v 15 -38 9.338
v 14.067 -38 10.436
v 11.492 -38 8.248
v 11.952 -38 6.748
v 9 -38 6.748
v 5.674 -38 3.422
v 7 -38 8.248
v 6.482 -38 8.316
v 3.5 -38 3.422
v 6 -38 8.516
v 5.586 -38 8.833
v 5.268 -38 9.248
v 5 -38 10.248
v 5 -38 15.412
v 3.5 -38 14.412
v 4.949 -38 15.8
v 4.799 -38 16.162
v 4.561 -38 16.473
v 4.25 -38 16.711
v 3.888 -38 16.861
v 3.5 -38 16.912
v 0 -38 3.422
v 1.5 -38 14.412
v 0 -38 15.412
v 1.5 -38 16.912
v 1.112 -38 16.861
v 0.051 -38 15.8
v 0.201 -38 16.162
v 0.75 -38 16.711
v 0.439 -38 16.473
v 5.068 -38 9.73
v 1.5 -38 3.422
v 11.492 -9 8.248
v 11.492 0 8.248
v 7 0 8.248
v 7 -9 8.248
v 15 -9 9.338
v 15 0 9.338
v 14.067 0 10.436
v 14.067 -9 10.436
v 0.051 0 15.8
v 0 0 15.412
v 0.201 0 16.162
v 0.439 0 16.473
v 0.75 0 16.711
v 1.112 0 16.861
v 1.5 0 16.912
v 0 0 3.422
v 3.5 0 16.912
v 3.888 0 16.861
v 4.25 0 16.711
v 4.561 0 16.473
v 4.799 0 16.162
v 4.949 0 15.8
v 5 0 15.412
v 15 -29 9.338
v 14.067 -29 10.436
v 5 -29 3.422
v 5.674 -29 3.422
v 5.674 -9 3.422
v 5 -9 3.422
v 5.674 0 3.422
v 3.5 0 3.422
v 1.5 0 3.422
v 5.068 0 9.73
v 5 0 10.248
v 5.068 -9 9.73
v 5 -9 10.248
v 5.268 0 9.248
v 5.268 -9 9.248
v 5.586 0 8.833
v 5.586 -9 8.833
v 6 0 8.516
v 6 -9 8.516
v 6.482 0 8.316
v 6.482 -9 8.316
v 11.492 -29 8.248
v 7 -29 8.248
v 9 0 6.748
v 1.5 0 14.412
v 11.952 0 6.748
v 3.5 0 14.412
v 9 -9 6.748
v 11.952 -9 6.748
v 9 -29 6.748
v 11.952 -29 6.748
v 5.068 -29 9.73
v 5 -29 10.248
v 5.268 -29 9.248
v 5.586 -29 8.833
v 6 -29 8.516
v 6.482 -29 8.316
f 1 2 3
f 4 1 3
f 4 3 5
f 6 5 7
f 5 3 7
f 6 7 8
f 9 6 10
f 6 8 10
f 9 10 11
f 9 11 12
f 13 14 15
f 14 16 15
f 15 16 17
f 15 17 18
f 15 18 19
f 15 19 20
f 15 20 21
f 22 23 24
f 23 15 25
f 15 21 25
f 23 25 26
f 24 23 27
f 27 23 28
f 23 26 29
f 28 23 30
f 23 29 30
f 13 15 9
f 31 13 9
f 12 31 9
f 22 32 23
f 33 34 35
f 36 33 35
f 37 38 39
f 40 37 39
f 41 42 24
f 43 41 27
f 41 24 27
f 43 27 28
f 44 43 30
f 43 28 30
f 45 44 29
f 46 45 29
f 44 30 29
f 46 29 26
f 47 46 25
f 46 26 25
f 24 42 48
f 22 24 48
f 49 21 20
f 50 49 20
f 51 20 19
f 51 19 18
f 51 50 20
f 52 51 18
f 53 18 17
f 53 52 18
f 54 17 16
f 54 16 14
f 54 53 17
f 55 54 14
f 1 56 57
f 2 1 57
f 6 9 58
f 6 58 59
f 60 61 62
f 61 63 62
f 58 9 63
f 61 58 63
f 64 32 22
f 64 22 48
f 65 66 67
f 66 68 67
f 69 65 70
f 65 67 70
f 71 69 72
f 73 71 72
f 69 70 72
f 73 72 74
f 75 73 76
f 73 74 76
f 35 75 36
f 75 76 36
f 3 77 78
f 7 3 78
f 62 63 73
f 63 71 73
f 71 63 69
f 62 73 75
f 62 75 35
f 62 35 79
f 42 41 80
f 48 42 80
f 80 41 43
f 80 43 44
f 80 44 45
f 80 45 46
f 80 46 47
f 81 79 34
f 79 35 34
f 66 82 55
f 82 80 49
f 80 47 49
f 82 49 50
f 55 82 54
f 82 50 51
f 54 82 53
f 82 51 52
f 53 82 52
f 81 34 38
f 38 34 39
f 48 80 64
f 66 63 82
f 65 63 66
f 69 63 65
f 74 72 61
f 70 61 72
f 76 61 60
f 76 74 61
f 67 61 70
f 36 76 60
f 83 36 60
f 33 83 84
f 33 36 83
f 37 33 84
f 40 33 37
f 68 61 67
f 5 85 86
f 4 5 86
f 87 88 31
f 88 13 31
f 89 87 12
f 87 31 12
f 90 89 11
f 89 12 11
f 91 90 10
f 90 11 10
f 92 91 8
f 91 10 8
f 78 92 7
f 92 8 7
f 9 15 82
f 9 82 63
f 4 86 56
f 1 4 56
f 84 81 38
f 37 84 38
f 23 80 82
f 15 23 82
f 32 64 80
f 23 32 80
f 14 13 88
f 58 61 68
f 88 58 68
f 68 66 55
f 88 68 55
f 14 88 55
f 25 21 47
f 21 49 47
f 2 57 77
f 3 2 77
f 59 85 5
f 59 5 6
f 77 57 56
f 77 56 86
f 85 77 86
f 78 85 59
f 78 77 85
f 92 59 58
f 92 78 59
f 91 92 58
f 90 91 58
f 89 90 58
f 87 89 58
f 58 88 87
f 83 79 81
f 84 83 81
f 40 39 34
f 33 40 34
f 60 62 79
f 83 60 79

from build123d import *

# Parameters (mm, degrees)
F1_DEPTH    = 38
F3_DEPTH    = 50
F4_T4_DEPTH = 9
F4_T9_DEPTH = 9
F5_W        = 38
F5_H        = 14.5097850376
F6_DEPTH    = 25
F7_R        = 2
F8_R        = 1.5


# Not quite as in the source:
# - a fillet or chamfer that OpenCascade refuses, or shapes differently, is made with other operations: its cross-section is extruded or revolved along the edge and cut away or added


with BuildPart() as f1:
    # F0 (on Front) → F1 (new body)
    with BuildSketch(Plane.XZ):
        Polygon((0, 16.9122221599), (0, -11.0877778401), (1.5, -11.0877778401), (1.5, 14.4122221599), (3.5, 14.4122221599), (3.5, 3.4220071975), (5, 3.4220071975), (5, 6.7475574595), (5, 8.2475574595), (5, 16.9122221599), align=None)
        Polygon((11.4920105912, 8.2475574595), (5, 8.2475574595), (5, 6.7475574595), (11.9522421048, 6.7475574595), (15, 9.3381504056), (14.0667535676, 10.4360879209), align=None)
    extrude(amount=F1_DEPTH)

    # F2 (on face) → F3 (cut)
    with BuildSketch(Plane.XY.offset(16.9122221599)):
        Polygon((16.5792163461, -29), (16.5792163461, -19), (16.5792163461, -9), (5, -9), (5, -29), align=None)
    extrude(amount=-F3_DEPTH, mode=Mode.SUBTRACT)

    # F4: chamfer of 4 on 2 edges, made by hand


with BuildPart() as f4_tool2:
    # F4_s3 → F4_t4 (new body)
    with BuildSketch(Plane.XZ.offset(29)):
        Polygon((9, 6.7475574595), (5, 2.7475574595), (5, 6.7475574595), align=None)
    extrude(amount=F4_T4_DEPTH)

    split(bisect_by=Plane.XY.offset(3.4220071975), keep=Keep.TOP)


with BuildPart() as f1_1:
    add(f1.part)

    # F4_t1: union F4_tool2
    add(f4_tool2.part)


with BuildPart() as f4_tool7:
    # F4_s8 → F4_t9 (new body)
    with BuildSketch(Plane.XZ):
        Polygon((5, 2.7475574595), (9, 6.7475574595), (5, 6.7475574595), align=None)
    extrude(amount=F4_T9_DEPTH)

    split(bisect_by=Plane.XY.offset(3.4220071975), keep=Keep.TOP)


with BuildPart() as f1_2:
    add(f1_1.part)

    # F4_t6: union F4_tool7
    add(f4_tool7.part)

    # F5 (on face) → F6 (cut)
    with BuildSketch(Plane.YZ.offset(1.5)):
        with Locations((-19, -3.8328853213)):
            Rectangle(F5_W, F5_H)
    extrude(amount=-F6_DEPTH, mode=Mode.SUBTRACT)

    # F7
    f7_edges = [f1_2.edges().sort_by_distance(p)[0] for p in [
        (5, -33.5, 8.247557),
        (5, -4.5, 8.247557),
    ]]
    fillet(f7_edges, radius=F7_R)

    # F8
    f8_edges = [f1_2.edges().sort_by_distance(p)[0] for p in [
        (5, -19, 16.912222),
        (0, -19, 16.912222),
    ]]
    fillet(f8_edges, radius=F8_R)


solid = f1_2.part
